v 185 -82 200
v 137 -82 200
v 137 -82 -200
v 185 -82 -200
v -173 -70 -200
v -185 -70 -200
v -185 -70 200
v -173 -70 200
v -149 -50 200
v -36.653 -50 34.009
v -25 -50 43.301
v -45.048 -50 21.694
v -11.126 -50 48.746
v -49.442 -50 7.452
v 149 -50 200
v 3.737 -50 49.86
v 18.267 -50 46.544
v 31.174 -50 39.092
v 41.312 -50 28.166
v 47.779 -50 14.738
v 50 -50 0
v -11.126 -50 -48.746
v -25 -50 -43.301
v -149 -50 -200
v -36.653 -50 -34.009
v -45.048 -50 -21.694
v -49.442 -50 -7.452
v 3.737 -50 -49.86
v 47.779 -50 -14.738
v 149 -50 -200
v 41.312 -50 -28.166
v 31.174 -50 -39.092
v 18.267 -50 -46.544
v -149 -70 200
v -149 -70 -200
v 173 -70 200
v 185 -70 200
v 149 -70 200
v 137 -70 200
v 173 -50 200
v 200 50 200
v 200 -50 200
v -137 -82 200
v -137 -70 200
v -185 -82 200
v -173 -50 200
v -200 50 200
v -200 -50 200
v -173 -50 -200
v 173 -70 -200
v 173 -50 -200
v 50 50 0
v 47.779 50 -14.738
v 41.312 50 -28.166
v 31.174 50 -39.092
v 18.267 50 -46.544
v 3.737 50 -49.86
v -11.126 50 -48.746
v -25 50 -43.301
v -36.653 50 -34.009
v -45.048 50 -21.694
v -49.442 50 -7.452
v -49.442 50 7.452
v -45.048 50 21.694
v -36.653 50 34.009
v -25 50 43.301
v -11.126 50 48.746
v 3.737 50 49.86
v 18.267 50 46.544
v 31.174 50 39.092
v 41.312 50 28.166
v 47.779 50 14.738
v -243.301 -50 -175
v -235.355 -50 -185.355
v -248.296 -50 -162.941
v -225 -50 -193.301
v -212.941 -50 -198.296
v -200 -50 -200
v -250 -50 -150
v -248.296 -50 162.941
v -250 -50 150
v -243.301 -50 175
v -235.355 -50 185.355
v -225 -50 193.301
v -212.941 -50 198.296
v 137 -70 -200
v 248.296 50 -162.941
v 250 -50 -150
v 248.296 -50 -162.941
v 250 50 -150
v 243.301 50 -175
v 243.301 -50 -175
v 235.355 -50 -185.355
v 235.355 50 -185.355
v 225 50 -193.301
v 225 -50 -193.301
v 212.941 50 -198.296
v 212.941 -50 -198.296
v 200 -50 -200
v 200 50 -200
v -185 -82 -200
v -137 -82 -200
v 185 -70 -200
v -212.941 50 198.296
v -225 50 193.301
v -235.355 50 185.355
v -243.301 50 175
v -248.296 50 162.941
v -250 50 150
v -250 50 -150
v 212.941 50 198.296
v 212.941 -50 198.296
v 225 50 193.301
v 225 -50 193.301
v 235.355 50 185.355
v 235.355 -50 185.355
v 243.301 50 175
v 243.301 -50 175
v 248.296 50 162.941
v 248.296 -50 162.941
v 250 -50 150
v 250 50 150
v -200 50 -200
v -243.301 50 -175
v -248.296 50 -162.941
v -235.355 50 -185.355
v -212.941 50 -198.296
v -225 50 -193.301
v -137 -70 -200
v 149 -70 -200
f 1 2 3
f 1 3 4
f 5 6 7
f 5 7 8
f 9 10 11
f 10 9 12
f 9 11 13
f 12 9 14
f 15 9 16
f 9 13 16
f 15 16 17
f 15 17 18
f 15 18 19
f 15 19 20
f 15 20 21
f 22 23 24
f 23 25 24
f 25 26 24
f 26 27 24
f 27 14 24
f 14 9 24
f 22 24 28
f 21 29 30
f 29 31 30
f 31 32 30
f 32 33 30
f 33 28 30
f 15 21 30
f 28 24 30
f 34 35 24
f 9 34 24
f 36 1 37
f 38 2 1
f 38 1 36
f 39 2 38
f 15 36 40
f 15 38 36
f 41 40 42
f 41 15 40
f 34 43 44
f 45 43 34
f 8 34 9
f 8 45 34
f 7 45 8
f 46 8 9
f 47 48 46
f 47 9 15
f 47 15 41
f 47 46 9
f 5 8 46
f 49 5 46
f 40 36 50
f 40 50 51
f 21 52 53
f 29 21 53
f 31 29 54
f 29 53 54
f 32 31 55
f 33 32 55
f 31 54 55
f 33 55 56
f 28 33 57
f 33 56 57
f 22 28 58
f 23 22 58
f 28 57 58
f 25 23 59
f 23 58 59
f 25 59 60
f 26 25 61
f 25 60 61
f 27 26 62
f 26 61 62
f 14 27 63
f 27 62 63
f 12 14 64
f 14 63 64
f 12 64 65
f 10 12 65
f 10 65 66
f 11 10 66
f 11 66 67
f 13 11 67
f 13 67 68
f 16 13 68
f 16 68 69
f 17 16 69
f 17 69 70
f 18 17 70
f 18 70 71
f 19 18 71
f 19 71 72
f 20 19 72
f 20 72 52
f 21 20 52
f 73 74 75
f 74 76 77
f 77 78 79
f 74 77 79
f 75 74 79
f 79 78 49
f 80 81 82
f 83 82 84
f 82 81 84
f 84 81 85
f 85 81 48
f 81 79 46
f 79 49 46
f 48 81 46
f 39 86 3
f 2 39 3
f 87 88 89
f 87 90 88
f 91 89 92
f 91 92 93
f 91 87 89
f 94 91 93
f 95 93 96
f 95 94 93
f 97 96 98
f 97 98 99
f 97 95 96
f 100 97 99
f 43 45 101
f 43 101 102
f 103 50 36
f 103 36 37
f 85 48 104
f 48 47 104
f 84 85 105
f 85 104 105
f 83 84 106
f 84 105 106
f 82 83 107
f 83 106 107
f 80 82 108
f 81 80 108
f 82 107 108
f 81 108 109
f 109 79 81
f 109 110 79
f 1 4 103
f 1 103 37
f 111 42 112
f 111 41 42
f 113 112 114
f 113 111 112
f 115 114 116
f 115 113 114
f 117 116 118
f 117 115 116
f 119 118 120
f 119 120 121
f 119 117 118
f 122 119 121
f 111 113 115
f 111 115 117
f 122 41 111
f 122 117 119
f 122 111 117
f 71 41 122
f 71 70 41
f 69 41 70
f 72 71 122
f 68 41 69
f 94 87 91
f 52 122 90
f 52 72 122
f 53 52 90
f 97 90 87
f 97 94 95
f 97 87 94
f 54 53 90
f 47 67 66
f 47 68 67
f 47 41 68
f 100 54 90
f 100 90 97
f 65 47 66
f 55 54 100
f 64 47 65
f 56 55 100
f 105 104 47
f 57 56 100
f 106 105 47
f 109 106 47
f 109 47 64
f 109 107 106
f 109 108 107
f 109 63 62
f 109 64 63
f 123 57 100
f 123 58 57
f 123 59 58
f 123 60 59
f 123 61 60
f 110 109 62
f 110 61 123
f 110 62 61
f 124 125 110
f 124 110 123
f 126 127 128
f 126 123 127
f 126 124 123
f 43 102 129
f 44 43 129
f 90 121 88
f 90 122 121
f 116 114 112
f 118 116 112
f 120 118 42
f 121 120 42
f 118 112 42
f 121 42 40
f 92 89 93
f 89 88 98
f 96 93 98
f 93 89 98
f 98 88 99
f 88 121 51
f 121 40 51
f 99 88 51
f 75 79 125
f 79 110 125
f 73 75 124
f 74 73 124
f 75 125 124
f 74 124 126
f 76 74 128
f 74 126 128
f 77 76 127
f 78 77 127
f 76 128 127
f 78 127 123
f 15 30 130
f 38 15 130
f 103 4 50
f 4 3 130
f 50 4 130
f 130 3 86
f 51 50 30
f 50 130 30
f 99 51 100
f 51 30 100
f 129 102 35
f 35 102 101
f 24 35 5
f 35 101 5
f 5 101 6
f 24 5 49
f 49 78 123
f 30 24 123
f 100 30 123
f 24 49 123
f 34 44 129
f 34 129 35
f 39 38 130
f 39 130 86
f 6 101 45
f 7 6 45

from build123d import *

# Parameters (mm, degrees)
SKETCH_1_W          = 370
SKETCH_1_H          = 400
EXTRUDE_1_DEPTH     = 132
SKETCH_2_W          = 12
SKETCH_2_H          = 119.999999988
CUT_EXTRUDE_1_DEPTH = 449.273354104
SKETCH_3_W          = 400
SKETCH_3_H          = 100
EXTRUDE_2_DEPTH     = 77
SKETCH_4_W          = 12
SKETCH_4_H          = 119.999999988
CUT_EXTRUDE_2_DEPTH = 479.773432847
SKETCH_5_W          = 400
SKETCH_5_H          = 100
EXTRUDE_3_DEPTH     = 77
CUT_EXTRUDE_3_DEPTH = 479.773432847
HOLE_WIZARD_1_D     = 100
FILLET_1_R          = 50


with BuildPart() as part:
    # 草图1 → 凸台-拉伸1 (new body)
    with BuildSketch(Plane.XZ.offset(82)):
        Rectangle(SKETCH_1_W, SKETCH_1_H)
    extrude(amount=-EXTRUDE_1_DEPTH)

    # 草图2 → 切除-拉伸1 (cut, through all)
    with BuildSketch(Plane.XY.offset(200)):
        with Locations((-179, -9.999999994)):
            Rectangle(SKETCH_2_W, SKETCH_2_H)
    extrude(amount=-CUT_EXTRUDE_1_DEPTH, mode=Mode.SUBTRACT)

    # 草图3 → 凸台-拉伸2 (add)
    with BuildSketch(Plane.ZY.offset(173)):
        Rectangle(SKETCH_3_W, SKETCH_3_H)
    extrude(amount=EXTRUDE_2_DEPTH)

    # 草图4 → 切除-拉伸2 (cut, through all)
    with BuildSketch(Plane.XY.offset(200)):
        with Locations((179, -9.999999994)):
            Rectangle(SKETCH_4_W, SKETCH_4_H)
    extrude(amount=-CUT_EXTRUDE_2_DEPTH, mode=Mode.SUBTRACT)

    # 草图5 → 凸台-拉伸3 (add)
    with BuildSketch(Plane(origin=(173, 0, 0), x_dir=(0, 0, -1), z_dir=(1, 0, 0))):
        Rectangle(SKETCH_5_W, SKETCH_5_H)
    extrude(amount=EXTRUDE_3_DEPTH)

    # 草图6 → 切除-拉伸3 (cut, through all)
    with BuildSketch(Plane(origin=(0, 0, -200), x_dir=(-1, 0, 0), z_dir=(0, 0, -1))):
        Polygon((-137, -82), (137, -82), (137, -69.999999997), (149, -69.999999997), (149, -50), (-149, -50), (-149, -69.999999997), (-137, -69.999999997), align=None)
    extrude(amount=-CUT_EXTRUDE_3_DEPTH, mode=Mode.SUBTRACT)

    # 孔1 (through all)
    with Locations(Plane(origin=(0, -50, 0), x_dir=(-1, 0, 0), z_dir=(0, -1, 0))):
        with Locations((0, 0)):
            Hole(HOLE_WIZARD_1_D / 2)

    # 圆角1
    fillet_1_edges = [part.edges().sort_by_distance(p)[0] for p in [
        (-250, 0, -200),
        (-250, 0, 200),
        (250, 0, -200),
        (250, 0, 200),
    ]]
    fillet(fillet_1_edges, radius=FILLET_1_R)


solid = part.part
